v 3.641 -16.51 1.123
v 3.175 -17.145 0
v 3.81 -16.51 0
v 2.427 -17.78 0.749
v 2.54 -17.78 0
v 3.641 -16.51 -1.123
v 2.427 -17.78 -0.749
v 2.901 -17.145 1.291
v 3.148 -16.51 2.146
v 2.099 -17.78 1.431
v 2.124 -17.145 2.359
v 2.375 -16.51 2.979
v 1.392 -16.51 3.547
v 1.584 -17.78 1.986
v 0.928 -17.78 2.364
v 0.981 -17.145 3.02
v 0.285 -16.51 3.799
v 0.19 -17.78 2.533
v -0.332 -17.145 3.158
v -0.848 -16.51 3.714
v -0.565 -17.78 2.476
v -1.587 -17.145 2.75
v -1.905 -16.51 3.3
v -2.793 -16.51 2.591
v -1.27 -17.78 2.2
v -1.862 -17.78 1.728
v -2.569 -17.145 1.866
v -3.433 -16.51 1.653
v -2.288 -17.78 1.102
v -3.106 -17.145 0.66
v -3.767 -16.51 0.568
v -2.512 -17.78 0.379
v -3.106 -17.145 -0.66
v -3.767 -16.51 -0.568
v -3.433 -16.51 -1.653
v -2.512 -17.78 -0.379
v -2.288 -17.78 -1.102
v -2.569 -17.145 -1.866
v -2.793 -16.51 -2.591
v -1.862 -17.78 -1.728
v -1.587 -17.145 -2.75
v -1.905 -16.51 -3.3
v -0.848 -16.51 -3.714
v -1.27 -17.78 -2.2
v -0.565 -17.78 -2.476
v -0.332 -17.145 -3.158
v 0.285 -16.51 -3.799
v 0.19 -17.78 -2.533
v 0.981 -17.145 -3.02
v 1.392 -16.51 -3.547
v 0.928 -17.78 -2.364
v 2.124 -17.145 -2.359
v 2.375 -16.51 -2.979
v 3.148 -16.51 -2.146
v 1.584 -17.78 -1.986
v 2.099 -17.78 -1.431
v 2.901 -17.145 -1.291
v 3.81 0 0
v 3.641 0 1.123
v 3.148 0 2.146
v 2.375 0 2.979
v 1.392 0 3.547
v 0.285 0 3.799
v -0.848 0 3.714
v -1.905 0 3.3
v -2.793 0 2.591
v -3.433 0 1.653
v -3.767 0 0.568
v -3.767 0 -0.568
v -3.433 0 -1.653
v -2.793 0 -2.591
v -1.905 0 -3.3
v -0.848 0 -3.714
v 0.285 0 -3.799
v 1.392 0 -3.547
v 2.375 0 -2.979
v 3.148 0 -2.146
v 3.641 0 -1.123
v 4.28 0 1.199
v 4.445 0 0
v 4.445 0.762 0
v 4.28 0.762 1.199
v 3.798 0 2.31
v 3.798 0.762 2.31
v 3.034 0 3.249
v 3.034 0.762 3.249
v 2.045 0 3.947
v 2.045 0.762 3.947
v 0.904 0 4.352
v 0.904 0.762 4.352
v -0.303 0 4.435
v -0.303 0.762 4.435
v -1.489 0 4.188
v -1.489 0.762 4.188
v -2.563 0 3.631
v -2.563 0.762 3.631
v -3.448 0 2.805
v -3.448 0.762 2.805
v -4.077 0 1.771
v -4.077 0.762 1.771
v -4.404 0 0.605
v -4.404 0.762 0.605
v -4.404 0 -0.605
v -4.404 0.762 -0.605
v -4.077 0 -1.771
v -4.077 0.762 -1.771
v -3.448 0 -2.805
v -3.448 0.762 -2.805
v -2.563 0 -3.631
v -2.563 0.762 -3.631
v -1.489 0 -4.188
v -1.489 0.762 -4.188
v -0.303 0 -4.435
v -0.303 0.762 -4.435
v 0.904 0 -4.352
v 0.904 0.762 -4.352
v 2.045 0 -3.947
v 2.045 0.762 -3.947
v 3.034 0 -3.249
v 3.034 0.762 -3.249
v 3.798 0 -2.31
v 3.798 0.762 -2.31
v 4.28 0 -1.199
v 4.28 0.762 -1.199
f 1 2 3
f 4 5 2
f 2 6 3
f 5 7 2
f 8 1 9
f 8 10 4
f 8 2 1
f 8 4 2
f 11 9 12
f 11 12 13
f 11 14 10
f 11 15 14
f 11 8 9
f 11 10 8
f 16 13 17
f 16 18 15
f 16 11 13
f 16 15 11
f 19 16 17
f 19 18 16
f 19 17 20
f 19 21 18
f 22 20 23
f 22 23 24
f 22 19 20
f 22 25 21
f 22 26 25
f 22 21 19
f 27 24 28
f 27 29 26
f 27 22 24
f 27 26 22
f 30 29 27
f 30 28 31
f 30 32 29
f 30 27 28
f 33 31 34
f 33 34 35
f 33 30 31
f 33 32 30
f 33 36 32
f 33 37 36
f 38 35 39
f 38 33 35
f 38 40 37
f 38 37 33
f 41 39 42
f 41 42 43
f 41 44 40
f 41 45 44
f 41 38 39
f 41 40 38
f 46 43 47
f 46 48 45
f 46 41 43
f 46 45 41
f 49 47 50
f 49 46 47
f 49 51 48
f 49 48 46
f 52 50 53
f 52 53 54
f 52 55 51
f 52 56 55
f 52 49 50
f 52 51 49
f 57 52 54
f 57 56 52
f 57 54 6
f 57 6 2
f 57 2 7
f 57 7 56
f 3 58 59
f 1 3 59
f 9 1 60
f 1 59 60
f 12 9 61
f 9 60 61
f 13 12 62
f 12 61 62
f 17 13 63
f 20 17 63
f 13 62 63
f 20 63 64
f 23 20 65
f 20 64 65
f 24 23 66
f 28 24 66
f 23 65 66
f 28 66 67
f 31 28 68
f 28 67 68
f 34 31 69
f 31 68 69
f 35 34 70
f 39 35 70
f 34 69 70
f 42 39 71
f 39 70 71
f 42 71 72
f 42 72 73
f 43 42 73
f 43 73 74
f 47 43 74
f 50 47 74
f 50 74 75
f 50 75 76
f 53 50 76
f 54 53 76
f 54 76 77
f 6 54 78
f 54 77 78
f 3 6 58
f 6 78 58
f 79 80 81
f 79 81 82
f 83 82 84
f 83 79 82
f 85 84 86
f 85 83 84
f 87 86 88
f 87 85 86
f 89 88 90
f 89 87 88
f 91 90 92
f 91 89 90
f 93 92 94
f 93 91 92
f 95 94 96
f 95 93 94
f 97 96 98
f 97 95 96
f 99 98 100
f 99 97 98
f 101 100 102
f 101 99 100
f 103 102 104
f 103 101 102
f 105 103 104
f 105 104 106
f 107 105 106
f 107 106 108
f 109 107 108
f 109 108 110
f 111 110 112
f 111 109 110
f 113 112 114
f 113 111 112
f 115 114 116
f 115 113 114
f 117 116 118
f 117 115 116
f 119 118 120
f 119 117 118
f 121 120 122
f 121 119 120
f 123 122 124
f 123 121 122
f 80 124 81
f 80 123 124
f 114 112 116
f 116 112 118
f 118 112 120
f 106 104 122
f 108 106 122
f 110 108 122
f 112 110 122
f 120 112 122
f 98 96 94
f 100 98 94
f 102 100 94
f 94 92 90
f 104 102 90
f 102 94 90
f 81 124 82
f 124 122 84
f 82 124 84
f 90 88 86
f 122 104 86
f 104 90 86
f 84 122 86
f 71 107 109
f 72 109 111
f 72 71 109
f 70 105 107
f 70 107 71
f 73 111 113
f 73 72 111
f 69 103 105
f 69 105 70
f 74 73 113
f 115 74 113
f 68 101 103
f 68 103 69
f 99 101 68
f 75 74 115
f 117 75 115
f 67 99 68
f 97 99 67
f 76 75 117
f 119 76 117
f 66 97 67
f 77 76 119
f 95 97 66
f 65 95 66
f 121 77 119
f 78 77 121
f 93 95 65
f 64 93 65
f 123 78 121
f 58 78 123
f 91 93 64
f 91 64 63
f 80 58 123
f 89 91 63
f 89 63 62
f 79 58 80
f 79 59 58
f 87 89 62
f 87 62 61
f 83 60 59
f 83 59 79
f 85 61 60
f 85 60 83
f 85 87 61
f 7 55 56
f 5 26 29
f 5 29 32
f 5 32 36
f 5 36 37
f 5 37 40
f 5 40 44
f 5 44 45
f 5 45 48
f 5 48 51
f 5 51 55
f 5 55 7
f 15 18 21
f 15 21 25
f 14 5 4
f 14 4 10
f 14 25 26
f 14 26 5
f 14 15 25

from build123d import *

# Parameters (mm, degrees)
F0_R     = 3.81
F1_DEPTH = 17.78
F2_R     = 4.445
F3_DEPTH = 0.762
F4_SIZE  = 1.27


with BuildPart() as f1:
    # F0 (on Front) → F1 (new body)
    with BuildSketch(Plane.XZ):
        Circle(F0_R)
    extrude(amount=F1_DEPTH)

    # F2 (on Front) → F3 (join)
    with BuildSketch(Plane.XZ):
        Circle(F2_R)
    extrude(amount=-F3_DEPTH)

    # F4
    f4_edges = [f1.edges().sort_by_distance(p)[0] for p in [
        (-3.81, -17.78, 0),
    ]]
    chamfer(f4_edges, length=F4_SIZE)


solid = f1.part
